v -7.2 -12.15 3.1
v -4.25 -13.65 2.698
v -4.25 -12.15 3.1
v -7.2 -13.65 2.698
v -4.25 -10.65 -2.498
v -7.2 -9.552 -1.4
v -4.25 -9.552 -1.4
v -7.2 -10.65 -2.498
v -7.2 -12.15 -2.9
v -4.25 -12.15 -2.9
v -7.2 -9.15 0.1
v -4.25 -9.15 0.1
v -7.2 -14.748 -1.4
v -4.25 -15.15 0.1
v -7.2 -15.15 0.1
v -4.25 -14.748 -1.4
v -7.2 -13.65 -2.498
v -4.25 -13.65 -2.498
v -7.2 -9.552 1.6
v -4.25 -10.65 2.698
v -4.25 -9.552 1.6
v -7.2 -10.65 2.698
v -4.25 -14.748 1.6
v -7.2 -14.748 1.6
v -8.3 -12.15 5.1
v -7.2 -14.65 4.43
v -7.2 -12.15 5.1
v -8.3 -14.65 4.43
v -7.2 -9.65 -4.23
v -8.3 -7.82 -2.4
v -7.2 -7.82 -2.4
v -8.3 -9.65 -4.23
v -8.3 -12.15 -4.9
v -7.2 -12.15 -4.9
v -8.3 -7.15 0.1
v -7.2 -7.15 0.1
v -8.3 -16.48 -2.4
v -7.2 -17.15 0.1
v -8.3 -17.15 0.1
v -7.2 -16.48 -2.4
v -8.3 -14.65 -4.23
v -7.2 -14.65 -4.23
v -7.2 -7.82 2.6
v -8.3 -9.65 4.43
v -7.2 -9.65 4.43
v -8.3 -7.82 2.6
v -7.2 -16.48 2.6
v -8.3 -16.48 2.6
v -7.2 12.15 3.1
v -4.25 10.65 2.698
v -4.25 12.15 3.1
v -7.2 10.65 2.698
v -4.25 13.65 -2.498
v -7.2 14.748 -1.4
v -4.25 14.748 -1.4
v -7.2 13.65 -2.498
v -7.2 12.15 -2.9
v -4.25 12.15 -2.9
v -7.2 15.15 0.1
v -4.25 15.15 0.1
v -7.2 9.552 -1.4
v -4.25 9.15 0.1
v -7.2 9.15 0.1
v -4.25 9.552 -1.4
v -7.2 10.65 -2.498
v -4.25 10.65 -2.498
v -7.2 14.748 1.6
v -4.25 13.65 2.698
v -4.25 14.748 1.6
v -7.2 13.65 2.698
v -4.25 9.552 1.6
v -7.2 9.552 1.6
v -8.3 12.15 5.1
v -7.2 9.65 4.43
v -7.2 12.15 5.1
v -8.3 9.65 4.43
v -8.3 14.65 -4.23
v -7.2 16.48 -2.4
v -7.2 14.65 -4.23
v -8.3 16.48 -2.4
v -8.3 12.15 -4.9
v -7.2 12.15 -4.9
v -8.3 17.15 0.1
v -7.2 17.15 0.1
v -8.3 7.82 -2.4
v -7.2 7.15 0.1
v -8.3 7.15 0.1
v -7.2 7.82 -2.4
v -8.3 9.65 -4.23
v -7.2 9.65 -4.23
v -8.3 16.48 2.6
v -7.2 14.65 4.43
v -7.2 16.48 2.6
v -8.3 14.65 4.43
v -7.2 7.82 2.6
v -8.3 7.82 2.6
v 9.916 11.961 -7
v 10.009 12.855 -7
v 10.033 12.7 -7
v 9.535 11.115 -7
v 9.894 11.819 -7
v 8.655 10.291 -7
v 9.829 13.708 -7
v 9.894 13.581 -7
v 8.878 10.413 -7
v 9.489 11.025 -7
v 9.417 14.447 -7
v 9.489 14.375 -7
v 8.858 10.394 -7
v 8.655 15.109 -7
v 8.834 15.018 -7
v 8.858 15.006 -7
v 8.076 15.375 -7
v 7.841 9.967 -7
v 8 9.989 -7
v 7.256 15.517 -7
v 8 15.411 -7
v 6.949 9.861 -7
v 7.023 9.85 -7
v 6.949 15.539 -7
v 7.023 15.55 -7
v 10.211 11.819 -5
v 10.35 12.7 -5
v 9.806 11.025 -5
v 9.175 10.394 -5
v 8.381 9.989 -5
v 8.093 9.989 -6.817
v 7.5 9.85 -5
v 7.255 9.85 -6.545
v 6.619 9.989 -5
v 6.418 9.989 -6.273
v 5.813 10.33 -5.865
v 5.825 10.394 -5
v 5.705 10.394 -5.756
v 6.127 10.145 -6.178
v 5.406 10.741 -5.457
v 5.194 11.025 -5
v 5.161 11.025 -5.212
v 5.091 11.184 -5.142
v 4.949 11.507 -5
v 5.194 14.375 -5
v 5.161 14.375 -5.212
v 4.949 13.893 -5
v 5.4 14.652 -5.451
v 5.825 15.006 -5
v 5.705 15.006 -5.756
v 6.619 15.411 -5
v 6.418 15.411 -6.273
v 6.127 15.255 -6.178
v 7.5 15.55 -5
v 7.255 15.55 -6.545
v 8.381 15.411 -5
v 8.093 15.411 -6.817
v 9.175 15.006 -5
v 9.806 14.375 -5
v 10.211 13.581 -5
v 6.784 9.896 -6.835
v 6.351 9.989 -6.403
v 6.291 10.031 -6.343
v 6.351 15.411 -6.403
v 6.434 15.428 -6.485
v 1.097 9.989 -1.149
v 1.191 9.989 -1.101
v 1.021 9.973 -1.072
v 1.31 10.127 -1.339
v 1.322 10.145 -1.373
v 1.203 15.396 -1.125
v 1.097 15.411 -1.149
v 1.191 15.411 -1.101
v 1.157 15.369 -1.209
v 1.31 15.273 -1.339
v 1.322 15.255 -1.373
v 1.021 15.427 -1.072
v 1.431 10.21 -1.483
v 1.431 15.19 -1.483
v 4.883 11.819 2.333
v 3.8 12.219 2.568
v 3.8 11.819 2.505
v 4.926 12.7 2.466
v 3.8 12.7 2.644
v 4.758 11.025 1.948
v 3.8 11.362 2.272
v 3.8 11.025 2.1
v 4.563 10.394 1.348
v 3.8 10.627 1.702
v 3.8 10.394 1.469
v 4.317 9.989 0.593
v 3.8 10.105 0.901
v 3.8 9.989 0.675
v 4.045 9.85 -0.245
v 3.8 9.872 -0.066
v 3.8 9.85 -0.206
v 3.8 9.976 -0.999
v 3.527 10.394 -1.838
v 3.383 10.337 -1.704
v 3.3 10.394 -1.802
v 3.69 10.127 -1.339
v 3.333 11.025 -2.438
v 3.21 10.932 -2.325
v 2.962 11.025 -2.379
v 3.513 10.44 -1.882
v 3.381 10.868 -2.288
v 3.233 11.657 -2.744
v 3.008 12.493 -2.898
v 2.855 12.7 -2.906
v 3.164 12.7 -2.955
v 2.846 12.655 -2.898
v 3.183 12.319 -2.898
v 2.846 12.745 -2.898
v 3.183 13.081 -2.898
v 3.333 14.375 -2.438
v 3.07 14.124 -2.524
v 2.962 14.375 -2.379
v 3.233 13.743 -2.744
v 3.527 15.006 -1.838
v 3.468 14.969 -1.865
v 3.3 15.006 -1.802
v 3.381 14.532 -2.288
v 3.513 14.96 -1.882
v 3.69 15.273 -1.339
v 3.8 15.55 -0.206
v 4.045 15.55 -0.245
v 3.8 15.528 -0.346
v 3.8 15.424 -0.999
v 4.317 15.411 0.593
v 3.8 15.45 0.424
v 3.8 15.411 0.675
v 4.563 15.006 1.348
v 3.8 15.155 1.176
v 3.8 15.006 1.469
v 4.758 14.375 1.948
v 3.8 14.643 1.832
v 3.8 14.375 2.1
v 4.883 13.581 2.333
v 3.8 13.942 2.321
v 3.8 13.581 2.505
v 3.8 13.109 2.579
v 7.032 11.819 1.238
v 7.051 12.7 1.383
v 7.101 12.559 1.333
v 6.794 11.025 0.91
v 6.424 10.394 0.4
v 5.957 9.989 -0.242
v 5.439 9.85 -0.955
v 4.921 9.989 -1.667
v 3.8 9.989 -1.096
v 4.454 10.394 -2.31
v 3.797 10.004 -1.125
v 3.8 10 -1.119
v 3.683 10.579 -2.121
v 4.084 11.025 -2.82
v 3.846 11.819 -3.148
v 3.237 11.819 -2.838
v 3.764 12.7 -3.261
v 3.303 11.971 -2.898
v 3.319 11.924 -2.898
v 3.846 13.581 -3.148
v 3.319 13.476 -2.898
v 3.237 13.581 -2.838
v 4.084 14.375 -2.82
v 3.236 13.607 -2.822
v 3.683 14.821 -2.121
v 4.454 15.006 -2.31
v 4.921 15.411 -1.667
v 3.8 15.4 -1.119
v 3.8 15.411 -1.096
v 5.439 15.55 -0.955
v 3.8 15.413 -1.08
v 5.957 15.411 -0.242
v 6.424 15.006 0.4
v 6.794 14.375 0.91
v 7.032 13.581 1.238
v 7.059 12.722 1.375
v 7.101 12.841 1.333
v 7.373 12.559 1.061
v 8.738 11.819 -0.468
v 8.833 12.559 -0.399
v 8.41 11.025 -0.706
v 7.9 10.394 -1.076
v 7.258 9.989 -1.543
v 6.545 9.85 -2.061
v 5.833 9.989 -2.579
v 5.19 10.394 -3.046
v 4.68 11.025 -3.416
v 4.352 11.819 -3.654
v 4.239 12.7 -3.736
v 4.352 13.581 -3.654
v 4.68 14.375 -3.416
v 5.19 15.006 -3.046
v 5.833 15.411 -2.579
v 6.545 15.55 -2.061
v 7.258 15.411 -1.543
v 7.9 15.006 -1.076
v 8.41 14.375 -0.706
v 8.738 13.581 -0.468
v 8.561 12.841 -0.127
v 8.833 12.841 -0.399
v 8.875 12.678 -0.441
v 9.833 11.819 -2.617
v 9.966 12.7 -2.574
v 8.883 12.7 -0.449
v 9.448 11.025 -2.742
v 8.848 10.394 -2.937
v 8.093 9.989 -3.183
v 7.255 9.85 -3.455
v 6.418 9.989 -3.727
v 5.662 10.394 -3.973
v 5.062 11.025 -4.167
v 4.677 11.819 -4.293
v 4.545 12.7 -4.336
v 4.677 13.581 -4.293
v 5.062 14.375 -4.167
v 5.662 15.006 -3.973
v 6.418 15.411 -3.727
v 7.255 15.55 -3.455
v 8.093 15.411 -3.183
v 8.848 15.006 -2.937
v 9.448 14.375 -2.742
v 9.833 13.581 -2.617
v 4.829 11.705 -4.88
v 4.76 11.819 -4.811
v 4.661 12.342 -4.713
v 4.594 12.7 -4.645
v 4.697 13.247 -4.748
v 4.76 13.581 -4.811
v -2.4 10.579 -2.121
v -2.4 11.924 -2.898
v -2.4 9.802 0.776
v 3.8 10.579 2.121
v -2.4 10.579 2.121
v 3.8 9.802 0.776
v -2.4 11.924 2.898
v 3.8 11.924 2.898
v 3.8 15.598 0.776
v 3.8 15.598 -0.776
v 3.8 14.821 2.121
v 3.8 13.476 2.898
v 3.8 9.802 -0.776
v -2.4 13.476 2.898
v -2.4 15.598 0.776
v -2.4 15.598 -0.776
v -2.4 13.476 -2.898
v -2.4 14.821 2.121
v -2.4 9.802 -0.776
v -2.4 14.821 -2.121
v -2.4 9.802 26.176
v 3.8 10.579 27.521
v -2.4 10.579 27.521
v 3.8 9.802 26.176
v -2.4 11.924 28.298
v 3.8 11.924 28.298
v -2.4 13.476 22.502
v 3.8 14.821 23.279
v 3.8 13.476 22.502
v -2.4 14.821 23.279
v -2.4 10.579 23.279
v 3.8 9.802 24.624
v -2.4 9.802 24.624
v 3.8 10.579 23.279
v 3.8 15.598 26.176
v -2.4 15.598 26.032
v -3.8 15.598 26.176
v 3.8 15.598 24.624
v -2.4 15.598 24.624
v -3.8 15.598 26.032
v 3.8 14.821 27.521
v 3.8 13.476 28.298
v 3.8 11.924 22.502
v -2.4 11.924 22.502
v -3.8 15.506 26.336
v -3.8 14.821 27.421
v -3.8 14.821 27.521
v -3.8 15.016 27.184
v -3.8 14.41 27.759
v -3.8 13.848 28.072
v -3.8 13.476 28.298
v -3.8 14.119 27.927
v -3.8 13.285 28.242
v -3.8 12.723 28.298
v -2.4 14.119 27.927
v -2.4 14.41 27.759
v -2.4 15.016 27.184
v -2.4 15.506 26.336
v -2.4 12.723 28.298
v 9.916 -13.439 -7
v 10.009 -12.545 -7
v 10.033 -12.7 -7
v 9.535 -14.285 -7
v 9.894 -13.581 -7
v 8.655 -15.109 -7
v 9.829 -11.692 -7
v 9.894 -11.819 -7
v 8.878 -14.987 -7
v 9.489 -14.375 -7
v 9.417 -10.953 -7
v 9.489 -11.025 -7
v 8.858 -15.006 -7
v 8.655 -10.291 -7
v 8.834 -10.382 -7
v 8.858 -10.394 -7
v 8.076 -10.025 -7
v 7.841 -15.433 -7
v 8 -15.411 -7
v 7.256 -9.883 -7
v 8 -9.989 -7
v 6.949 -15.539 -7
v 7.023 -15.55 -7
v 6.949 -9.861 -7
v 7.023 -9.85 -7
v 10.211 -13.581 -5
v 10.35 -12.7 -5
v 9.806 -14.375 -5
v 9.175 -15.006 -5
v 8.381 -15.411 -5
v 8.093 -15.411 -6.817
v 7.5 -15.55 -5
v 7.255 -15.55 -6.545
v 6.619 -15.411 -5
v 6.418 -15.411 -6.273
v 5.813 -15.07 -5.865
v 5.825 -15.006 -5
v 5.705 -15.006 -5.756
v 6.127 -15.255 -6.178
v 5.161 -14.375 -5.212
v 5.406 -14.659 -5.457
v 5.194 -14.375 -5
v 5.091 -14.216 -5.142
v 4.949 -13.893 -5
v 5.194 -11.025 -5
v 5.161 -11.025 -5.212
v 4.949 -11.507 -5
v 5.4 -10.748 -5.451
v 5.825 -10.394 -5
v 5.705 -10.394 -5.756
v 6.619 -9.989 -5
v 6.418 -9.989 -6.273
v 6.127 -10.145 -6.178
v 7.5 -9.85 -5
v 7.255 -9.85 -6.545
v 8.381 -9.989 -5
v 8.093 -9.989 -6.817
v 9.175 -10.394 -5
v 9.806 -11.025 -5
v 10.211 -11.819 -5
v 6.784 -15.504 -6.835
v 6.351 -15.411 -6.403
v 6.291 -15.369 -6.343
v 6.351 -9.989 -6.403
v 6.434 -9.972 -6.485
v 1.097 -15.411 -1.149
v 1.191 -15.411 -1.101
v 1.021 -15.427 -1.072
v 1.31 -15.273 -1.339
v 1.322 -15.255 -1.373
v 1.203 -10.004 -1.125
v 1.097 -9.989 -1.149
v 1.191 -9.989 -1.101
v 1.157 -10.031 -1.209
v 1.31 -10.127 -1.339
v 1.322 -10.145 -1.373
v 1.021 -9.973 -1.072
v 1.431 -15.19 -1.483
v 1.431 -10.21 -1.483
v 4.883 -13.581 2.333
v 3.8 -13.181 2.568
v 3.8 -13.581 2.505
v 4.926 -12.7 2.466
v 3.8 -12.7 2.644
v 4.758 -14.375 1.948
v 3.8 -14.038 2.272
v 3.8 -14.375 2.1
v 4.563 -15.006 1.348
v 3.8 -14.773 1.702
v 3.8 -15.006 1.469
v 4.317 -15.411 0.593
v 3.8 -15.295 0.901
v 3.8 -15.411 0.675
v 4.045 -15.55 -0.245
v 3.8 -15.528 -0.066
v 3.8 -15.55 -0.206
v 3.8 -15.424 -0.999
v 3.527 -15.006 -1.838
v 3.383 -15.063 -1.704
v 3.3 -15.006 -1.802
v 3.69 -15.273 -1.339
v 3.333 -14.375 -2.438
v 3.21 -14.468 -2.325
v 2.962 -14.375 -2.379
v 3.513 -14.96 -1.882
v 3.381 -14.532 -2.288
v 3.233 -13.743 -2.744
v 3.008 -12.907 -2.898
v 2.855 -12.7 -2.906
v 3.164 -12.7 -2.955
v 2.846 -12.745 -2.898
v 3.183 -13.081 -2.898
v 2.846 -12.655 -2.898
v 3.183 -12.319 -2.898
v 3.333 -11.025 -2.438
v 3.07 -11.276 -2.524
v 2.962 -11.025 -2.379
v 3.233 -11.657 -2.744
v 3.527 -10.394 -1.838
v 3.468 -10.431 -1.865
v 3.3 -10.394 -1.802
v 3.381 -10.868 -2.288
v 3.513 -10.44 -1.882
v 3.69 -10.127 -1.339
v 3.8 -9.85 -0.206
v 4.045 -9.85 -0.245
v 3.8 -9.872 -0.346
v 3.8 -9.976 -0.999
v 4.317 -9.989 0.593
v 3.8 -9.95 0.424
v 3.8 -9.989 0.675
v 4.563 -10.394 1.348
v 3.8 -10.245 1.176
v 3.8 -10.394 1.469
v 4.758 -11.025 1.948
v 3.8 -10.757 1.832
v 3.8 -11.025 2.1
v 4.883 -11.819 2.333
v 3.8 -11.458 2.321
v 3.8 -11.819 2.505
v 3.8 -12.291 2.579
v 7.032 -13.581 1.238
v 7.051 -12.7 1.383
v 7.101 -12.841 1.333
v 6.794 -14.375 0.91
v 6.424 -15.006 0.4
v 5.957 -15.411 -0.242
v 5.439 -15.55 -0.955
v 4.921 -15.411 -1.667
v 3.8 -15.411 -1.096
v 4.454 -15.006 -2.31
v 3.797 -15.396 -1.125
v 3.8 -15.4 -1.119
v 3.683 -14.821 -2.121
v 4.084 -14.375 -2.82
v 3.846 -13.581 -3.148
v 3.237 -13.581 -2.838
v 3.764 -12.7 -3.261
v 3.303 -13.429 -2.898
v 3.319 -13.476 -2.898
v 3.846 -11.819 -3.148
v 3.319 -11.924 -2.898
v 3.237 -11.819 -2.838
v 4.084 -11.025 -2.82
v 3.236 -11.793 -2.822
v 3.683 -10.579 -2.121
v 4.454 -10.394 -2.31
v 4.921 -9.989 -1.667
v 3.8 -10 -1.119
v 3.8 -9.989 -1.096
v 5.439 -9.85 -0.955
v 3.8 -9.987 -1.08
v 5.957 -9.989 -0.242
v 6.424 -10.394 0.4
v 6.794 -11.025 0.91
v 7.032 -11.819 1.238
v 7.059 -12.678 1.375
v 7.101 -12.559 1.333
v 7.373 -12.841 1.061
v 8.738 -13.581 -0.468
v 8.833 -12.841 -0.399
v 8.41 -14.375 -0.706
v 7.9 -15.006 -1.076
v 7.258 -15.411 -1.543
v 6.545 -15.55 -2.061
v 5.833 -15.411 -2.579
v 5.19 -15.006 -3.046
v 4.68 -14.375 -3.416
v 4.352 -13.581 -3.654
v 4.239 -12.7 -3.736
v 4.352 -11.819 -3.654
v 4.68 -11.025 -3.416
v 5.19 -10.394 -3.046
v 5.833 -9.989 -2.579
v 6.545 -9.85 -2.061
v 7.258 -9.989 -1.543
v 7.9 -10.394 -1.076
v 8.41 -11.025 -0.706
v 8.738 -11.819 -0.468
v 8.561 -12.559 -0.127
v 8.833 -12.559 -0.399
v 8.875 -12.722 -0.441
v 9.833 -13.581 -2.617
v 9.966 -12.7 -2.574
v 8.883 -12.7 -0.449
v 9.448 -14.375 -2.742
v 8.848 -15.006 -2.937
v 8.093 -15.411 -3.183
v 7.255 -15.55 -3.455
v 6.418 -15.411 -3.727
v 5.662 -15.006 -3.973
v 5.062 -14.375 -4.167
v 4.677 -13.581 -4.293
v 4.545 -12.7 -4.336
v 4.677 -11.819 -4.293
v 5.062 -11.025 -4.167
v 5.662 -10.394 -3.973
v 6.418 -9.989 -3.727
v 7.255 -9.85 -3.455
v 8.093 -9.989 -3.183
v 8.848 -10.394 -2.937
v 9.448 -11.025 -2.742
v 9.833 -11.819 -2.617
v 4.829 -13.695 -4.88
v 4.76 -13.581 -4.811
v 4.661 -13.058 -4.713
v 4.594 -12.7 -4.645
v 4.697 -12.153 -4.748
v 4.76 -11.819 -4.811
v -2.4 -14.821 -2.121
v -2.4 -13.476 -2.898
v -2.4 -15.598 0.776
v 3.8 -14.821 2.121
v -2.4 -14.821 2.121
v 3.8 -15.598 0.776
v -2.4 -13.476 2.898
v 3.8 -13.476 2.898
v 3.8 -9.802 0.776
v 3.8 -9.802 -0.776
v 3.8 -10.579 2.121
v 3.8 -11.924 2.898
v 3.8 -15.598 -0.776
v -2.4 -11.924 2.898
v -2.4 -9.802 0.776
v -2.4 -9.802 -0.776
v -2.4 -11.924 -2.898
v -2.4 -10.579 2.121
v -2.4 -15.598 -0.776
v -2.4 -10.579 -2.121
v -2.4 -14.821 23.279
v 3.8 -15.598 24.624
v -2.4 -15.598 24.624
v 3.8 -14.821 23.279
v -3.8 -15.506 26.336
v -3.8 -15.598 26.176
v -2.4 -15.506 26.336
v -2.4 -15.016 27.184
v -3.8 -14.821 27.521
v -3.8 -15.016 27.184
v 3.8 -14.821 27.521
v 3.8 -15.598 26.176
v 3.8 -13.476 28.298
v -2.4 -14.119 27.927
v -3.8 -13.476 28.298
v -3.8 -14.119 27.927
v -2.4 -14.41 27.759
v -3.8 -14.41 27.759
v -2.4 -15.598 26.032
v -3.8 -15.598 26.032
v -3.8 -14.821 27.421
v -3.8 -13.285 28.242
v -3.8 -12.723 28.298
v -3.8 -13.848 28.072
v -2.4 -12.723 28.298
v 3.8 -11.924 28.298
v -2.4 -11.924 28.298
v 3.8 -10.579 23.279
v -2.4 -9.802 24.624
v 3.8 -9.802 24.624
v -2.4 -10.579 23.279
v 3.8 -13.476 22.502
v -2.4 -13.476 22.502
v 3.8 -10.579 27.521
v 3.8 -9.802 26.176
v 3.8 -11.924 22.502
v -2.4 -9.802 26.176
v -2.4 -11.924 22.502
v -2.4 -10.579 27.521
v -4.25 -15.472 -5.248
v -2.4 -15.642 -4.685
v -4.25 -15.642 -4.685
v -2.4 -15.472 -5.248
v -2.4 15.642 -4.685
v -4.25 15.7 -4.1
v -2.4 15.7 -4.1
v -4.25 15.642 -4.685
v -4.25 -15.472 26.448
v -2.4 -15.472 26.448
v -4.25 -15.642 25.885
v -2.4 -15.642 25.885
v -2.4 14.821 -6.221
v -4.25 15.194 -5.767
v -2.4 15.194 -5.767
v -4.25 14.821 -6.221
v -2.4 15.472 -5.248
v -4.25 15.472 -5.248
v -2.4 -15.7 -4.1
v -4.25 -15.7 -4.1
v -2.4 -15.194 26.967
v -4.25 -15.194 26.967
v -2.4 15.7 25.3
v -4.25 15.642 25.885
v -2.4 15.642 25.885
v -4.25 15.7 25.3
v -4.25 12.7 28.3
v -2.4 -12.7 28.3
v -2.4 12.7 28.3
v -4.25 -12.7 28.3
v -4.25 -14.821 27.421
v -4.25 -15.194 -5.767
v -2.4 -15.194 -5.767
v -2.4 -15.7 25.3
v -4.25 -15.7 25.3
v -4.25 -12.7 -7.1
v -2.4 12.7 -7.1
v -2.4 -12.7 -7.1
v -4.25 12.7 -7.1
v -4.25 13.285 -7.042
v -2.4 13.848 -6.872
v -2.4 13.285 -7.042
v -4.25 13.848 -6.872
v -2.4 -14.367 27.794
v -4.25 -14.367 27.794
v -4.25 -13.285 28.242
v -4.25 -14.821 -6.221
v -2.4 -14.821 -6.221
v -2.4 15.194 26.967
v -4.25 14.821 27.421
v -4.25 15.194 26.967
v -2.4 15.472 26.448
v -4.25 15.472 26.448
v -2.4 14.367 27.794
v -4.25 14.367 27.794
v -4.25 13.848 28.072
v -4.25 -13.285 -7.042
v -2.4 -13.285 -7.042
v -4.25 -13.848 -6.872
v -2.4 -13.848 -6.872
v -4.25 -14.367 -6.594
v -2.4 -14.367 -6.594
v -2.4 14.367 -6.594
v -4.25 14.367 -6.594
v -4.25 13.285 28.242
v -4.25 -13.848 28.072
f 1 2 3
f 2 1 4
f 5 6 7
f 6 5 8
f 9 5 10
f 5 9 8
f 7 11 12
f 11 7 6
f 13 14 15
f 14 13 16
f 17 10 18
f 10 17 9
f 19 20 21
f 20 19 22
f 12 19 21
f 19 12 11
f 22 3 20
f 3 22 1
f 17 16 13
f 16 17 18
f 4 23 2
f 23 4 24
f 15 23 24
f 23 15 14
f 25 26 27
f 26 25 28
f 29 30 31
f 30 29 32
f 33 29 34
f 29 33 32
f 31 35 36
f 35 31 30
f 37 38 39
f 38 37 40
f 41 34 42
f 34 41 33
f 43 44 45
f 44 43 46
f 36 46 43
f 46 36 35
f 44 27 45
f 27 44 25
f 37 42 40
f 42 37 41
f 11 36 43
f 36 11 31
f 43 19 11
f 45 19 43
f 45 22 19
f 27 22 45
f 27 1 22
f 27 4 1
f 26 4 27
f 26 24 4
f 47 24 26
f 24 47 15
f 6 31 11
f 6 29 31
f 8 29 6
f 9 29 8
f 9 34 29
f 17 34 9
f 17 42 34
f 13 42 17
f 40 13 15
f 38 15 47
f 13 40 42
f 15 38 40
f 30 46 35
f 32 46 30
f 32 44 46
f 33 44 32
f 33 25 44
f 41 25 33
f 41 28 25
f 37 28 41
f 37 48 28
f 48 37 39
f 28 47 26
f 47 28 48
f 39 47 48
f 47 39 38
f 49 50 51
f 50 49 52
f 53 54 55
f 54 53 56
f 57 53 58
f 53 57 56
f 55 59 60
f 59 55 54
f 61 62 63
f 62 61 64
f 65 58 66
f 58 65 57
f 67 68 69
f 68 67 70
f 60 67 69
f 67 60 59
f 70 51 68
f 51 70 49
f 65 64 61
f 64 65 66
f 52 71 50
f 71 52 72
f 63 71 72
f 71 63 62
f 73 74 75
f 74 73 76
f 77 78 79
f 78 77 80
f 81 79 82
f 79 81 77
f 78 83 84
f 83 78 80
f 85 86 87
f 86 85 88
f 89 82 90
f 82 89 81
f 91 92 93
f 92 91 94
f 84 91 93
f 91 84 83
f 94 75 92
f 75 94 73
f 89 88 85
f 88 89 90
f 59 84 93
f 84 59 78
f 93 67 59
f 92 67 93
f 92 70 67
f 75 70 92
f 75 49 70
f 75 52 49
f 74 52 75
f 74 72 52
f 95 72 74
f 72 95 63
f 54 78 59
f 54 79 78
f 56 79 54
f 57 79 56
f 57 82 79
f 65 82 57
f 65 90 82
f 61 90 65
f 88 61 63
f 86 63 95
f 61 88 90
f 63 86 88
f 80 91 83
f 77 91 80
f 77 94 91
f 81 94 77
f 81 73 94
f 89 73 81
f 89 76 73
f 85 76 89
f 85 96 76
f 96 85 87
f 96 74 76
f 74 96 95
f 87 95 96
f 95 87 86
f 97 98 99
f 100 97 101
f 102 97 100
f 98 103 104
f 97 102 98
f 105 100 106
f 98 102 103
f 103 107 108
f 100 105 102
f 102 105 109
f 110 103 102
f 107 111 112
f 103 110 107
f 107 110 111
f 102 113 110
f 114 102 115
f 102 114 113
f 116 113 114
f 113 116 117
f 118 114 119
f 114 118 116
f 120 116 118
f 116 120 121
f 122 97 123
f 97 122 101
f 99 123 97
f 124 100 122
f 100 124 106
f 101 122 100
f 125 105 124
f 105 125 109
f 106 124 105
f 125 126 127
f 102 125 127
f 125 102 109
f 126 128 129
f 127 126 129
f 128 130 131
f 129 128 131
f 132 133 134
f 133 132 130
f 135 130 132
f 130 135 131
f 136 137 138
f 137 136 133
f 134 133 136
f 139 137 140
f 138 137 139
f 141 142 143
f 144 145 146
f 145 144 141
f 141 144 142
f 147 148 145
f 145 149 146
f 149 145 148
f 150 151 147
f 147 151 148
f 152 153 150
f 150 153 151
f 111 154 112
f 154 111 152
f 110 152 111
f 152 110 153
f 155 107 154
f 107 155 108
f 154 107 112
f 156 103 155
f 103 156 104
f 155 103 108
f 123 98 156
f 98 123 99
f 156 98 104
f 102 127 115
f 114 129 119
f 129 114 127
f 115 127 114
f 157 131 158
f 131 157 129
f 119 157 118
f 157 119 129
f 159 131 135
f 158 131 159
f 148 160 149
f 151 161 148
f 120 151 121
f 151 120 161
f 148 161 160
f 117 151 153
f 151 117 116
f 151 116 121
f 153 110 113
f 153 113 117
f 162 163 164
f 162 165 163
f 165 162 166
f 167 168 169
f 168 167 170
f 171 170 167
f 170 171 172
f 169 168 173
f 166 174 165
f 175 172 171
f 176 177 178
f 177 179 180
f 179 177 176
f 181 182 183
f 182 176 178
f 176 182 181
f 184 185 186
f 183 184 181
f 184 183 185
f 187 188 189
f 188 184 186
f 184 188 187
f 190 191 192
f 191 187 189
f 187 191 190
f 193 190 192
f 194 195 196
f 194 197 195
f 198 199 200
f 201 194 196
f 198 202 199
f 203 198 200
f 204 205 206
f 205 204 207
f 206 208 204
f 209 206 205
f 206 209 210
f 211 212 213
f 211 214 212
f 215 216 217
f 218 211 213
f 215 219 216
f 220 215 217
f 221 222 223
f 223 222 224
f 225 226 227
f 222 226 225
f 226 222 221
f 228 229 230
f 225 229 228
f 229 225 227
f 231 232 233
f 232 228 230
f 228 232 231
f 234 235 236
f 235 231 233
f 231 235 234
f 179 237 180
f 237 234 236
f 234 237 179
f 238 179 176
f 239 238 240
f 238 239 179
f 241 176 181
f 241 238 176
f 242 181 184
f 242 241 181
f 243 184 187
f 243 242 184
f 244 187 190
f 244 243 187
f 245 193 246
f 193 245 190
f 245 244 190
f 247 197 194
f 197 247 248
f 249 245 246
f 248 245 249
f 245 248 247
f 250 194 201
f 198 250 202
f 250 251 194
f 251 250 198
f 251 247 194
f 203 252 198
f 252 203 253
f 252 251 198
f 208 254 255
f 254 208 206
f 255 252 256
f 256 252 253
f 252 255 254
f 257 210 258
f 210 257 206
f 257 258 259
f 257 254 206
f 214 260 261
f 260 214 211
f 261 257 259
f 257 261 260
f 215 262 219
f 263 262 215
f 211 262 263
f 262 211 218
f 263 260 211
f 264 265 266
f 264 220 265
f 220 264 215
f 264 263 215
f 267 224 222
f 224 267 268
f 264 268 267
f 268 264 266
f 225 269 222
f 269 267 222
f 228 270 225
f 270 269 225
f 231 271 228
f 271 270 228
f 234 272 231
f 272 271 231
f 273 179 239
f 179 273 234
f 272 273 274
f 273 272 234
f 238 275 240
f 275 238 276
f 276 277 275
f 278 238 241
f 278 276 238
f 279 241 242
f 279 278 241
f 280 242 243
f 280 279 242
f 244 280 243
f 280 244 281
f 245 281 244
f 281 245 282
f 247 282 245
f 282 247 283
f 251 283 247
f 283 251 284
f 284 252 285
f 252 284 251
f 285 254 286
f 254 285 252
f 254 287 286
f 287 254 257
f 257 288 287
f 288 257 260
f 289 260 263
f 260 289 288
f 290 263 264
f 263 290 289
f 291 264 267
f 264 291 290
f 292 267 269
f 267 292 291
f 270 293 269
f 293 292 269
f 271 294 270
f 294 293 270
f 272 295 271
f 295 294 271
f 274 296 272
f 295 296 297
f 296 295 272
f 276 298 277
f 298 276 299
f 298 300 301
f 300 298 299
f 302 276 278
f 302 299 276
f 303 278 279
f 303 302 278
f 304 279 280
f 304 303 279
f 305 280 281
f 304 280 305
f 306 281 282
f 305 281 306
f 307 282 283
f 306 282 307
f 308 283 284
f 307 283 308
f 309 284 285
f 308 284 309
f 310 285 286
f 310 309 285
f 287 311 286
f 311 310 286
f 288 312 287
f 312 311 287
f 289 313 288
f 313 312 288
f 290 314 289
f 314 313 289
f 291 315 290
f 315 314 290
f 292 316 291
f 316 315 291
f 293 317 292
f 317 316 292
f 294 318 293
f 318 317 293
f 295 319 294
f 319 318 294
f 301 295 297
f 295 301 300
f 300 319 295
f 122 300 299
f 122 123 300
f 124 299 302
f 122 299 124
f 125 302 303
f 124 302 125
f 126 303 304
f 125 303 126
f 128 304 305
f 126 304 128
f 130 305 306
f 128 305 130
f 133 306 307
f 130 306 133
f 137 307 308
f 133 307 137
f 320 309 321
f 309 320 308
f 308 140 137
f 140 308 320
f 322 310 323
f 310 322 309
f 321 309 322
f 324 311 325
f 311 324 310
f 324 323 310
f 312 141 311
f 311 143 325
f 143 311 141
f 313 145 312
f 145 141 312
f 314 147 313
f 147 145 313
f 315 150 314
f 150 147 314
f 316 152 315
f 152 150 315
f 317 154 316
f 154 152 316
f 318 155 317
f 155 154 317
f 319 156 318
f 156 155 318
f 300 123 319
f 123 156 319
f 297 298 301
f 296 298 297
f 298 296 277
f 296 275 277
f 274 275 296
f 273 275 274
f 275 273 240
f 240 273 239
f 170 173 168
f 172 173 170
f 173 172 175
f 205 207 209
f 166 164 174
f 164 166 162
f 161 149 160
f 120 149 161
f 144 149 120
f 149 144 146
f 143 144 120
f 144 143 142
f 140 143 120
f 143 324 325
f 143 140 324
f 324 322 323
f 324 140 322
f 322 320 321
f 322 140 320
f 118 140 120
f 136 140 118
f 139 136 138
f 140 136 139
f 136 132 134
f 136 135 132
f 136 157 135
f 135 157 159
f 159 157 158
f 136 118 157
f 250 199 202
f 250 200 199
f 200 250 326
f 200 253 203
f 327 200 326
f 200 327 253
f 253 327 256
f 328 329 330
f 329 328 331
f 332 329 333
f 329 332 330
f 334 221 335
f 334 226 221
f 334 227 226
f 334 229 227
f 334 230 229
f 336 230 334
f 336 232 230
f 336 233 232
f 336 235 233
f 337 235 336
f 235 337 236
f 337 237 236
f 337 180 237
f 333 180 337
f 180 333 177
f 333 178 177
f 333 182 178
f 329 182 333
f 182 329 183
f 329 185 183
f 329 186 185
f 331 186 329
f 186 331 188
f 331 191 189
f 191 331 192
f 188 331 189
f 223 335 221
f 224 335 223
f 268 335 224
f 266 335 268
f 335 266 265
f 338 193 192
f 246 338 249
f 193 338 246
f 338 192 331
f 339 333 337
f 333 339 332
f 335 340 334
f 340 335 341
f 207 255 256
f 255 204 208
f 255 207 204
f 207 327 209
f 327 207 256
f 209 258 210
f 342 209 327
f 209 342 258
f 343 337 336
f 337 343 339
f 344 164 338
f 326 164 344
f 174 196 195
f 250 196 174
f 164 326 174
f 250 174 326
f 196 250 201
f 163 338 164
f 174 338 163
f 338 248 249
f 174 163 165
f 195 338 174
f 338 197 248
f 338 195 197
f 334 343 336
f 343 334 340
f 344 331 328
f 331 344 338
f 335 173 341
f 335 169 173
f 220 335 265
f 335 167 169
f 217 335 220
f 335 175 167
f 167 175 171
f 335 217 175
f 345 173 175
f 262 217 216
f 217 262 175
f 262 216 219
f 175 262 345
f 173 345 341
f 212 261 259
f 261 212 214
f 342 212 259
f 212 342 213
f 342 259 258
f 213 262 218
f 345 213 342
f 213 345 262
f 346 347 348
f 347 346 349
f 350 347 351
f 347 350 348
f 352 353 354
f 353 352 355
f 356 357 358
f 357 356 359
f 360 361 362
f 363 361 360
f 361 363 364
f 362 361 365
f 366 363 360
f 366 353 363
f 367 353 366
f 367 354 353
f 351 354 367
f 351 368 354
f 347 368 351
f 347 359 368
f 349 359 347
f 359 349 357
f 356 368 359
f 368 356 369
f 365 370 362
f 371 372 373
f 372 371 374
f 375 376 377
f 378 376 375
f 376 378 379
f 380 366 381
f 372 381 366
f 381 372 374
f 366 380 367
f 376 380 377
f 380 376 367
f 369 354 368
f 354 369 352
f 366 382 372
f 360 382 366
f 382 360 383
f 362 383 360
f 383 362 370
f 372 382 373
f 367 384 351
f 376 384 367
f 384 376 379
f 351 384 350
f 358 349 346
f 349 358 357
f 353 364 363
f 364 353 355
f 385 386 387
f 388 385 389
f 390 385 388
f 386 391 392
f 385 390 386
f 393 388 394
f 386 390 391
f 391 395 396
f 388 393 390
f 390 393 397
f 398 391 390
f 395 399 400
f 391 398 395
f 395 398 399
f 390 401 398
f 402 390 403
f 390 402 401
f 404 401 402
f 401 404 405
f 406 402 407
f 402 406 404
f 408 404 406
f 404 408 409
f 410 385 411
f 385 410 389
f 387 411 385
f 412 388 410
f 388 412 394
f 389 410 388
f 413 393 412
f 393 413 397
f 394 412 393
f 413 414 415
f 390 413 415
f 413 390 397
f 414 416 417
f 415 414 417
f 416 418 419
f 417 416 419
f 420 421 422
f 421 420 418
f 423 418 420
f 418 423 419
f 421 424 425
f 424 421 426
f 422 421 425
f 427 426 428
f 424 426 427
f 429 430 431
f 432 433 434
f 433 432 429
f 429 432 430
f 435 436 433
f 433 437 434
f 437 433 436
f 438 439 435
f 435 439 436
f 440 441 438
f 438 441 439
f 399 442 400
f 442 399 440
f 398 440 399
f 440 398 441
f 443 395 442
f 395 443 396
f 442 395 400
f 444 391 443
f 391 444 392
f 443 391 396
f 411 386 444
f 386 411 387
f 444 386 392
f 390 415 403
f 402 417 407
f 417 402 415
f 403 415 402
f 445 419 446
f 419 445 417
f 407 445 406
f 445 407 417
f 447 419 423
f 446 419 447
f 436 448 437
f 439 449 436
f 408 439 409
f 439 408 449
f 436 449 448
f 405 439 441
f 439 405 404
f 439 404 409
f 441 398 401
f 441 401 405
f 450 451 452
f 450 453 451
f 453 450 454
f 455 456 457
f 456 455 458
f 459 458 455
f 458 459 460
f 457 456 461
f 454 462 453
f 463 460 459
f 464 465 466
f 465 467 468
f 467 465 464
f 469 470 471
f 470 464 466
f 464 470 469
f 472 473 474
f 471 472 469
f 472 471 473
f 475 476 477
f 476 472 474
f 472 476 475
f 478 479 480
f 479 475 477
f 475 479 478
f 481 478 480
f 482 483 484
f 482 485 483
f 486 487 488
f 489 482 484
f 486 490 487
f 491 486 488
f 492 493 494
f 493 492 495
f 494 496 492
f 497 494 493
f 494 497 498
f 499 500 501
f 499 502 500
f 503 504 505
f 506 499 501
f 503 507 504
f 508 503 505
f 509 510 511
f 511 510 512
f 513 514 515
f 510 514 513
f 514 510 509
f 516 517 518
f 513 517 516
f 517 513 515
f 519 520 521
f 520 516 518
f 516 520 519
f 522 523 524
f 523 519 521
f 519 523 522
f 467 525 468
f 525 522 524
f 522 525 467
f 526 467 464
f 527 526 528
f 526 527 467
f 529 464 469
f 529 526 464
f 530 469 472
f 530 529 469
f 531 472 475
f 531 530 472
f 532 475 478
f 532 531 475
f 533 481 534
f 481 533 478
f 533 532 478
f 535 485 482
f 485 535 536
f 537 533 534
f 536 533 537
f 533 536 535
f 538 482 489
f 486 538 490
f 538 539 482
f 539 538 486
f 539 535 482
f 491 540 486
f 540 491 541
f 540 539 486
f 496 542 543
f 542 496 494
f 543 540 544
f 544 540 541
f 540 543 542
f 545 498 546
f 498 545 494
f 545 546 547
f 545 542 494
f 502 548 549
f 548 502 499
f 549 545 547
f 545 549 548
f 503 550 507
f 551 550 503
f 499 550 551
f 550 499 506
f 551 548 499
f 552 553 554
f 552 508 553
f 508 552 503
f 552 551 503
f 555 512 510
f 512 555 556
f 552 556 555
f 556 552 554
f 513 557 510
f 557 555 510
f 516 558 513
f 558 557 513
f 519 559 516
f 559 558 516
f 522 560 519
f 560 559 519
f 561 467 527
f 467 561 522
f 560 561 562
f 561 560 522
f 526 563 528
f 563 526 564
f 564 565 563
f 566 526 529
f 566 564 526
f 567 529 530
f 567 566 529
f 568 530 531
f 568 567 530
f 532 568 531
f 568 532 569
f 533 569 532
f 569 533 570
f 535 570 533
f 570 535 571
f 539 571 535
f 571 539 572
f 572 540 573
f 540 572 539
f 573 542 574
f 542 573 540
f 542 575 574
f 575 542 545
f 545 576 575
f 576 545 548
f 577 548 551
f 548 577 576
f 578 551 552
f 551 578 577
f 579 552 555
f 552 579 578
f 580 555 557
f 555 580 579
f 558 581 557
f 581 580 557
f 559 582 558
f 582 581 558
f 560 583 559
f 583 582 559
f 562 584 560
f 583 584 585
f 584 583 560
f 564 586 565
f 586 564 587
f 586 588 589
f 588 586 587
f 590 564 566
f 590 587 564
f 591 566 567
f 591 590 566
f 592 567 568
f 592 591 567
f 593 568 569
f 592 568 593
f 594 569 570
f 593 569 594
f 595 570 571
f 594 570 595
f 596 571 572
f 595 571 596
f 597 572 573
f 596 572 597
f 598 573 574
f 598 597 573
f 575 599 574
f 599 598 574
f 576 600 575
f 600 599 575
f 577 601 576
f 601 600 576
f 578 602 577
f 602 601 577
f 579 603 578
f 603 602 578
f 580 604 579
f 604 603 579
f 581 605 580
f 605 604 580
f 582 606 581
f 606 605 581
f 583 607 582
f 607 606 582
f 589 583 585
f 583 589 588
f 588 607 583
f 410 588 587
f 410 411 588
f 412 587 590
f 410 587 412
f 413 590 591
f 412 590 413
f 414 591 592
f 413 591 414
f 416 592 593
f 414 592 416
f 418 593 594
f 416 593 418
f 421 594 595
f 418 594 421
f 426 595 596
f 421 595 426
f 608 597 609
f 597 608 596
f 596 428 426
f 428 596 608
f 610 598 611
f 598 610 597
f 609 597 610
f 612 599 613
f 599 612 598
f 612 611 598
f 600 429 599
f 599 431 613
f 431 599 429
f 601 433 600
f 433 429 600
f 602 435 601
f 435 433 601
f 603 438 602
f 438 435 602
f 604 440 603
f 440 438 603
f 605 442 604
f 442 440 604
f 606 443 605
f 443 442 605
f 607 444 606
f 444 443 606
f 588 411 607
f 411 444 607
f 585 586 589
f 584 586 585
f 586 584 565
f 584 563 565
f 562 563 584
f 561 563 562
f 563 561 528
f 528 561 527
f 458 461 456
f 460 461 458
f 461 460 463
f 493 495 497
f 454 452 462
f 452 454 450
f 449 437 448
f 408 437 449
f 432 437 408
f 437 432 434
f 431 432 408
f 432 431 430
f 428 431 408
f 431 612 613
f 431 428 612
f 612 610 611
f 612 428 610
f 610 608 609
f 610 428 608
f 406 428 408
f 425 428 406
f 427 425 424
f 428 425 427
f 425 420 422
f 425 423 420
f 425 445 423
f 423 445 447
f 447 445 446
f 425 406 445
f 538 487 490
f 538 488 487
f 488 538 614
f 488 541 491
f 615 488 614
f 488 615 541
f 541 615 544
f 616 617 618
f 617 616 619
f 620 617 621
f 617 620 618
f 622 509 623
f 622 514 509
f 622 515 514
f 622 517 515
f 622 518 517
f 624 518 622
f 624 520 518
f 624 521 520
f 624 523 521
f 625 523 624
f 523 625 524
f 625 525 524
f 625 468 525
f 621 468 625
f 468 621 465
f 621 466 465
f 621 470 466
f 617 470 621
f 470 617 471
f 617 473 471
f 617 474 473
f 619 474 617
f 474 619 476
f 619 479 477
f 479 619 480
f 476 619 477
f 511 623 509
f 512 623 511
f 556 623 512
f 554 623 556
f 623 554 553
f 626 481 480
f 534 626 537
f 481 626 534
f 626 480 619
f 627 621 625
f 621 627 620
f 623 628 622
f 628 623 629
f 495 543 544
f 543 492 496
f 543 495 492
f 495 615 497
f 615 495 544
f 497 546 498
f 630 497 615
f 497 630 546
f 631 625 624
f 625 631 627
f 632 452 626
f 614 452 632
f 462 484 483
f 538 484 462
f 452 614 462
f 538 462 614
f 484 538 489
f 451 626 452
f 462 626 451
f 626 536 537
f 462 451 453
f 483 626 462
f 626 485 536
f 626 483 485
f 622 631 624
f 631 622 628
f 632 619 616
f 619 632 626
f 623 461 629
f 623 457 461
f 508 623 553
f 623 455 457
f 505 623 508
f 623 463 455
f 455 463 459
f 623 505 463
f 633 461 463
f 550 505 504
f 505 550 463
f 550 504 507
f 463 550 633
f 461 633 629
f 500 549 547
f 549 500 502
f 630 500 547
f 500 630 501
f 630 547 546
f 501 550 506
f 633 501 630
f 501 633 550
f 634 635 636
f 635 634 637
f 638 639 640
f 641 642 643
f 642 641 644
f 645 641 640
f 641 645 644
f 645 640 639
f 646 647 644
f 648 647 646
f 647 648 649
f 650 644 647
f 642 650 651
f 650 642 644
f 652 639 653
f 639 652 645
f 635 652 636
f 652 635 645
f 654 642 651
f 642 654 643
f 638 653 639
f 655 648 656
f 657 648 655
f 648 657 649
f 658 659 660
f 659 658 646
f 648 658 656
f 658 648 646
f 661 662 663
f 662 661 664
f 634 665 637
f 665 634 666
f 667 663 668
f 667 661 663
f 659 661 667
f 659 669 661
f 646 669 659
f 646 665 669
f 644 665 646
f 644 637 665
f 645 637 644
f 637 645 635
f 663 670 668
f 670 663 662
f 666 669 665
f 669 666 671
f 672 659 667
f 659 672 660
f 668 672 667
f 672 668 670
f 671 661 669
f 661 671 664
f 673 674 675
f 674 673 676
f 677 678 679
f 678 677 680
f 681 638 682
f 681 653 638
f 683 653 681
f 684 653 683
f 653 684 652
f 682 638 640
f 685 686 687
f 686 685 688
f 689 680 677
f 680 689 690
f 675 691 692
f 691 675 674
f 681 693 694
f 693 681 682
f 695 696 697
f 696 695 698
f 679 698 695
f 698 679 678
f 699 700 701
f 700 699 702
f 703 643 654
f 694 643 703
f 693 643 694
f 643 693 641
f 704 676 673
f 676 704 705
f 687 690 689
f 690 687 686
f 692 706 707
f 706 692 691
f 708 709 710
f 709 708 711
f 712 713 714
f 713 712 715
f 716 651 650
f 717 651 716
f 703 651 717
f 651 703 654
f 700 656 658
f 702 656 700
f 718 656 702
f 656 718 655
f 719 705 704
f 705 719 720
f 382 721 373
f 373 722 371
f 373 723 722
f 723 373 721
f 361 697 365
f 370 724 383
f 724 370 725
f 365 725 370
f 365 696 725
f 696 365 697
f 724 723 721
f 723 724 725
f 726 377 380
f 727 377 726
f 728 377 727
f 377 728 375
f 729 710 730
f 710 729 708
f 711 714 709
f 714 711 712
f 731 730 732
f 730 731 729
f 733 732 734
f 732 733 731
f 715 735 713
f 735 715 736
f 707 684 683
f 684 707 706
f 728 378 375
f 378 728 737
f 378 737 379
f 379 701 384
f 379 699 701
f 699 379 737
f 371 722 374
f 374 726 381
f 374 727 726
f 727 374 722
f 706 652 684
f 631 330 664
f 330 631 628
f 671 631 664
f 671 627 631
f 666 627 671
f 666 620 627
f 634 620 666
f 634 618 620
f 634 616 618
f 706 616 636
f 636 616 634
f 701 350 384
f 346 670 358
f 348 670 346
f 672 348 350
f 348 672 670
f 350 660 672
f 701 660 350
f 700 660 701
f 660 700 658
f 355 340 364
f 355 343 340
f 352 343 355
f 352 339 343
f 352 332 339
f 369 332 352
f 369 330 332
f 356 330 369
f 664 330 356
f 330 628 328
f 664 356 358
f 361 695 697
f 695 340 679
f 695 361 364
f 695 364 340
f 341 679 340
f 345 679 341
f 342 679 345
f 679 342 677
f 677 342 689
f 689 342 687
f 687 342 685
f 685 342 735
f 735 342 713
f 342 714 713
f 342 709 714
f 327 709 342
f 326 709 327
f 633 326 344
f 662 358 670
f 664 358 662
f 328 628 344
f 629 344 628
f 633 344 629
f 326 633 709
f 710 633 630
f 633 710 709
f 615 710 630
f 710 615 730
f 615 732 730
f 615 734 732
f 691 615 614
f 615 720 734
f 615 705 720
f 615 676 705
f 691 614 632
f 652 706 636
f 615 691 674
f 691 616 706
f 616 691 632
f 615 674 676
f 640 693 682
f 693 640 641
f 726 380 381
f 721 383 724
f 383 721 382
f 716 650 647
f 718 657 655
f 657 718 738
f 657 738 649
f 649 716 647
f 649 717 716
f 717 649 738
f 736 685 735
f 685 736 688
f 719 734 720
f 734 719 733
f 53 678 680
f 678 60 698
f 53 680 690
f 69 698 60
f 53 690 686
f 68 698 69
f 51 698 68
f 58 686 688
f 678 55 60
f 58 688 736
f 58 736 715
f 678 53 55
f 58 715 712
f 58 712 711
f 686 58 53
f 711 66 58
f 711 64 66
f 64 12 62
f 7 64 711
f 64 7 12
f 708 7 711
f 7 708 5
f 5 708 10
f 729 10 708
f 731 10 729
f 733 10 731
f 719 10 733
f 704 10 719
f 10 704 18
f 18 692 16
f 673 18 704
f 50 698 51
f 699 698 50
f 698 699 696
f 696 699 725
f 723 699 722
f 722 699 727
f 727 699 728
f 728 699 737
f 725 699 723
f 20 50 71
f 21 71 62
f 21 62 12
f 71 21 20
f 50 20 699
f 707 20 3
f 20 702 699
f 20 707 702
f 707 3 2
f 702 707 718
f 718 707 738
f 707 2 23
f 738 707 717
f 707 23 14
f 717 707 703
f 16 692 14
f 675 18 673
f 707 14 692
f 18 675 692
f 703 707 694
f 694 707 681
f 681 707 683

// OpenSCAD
// keyhole slot remix of PEGSTR - Pegboard Wizard
// Modified by Shawn Featherly, October 2018
// Original PEGSTR - Pegboard Wizard by Marius Gheorghescu, November 2014

// preview[view:north, tilt:bottom diagonal]

// width / diameter of the keyslot neck
key_neck_width = 6;

// length of keyslot exposed neck
key_neck_length = 3;

// width / diameter of the keyslot head
key_head_width = 10;

// length of the keyslot head
key_head_length = 1;

// how far the 2 keyslots are from one another. 24.3
keyslot_seperation = 24.3;

// how thick are the walls. Hint: 6*extrusion width produces the best results.
wall_thickness = 1.85;

/* [Advanced] */
// what ratio of the holders bottom is reinforced to the plate [0.0-1.0]
strength_factor = 0.66;


/* [Hidden] */
// width of the panel
holder_x_size = keyslot_seperation + 10;

// depth of the orifice
holder_y_size = 10;

// hight of the holder
holder_height = 15;

// how many times to repeat the holder on X axis
holder_x_count = 1;

// how many times to repeat the holder on Y axis
holder_y_count = 2;

// orifice corner radius (roundness). Needs to be less than min(x,y)/2.
corner_radius = 30;

// what is the $fn parameter
holder_sides = max(50, min(20, holder_x_size*2));

// dimensions the same outside US?
hole_spacing = 25.4;
hole_size = 6;//6.0035;
board_thickness = 5;


holder_total_x = wall_thickness + holder_x_count*(wall_thickness+holder_x_size);
holder_total_y = wall_thickness + holder_y_count*(wall_thickness+holder_y_size);
holder_total_z = round(holder_height/hole_spacing)*hole_spacing;
holder_roundness = min(corner_radius, holder_x_size/2, holder_y_size/2); 


// what is the $fn parameter for holders
fn = 32;

epsilon = 0.1;

clip_height = 2*hole_size + 2;
$fn = fn;

module round_rect_ex(x1, y1, x2, y2, z, r1, r2)
{
	$fn=holder_sides;
	brim = z/10;

	//rotate([0,0,(holder_sides==6)?30:((holder_sides==4)?45:0)])
	hull() {
        translate([-x1/2 + r1, y1/2 - r1, z/2-brim/2])
            cylinder(r=r1, h=brim,center=true);
        translate([x1/2 - r1, y1/2 - r1, z/2-brim/2])
            cylinder(r=r1, h=brim,center=true);
        translate([-x1/2 + r1, -y1/2 + r1, z/2-brim/2])
            cylinder(r=r1, h=brim,center=true);
        translate([x1/2 - r1, -y1/2 + r1, z/2-brim/2])
            cylinder(r=r1, h=brim,center=true);

        translate([-x2/2 + r2, y2/2 - r2, -z/2+brim/2])
            cylinder(r=r2, h=brim,center=true);
        translate([x2/2 - r2, y2/2 - r2, -z/2+brim/2])
            cylinder(r=r2, h=brim,center=true);
        translate([-x2/2 + r2, -y2/2 + r2, -z/2+brim/2])
            cylinder(r=r2, h=brim,center=true);
        translate([x2/2 - r2, -y2/2 + r2, -z/2+brim/2])
            cylinder(r=r2, h=brim,center=true);

    }
}

module pin(clip)
{
	rotate([0,0,15])
		#cylinder(r=hole_size/2, h=board_thickness*1.5+epsilon, center=true, $fn=12);

// top row inserts should have a rounded tip
    
	if (clip) {
		//
		rotate([0,0,90])
		intersection() {
			translate([0, 0, hole_size-epsilon])
				cube([hole_size+2*epsilon, clip_height, 2*hole_size], center=true);

			// [-hole_size/2 - 1.95,0, board_thickness/2]
			translate([0, hole_size/2 + 2, board_thickness/2]) 
				rotate([0, 90, 0])
				rotate_extrude(convexity = 5, $fn=20)
				translate([5, 0, 0])
				 circle(r = (hole_size*0.95)/2); 
			
			translate([0, hole_size/2 + 2 - 1.6, board_thickness/2]) 
				rotate([45,0,0])
				translate([0, -0, hole_size*0.6])
					cube([hole_size+2*epsilon, 3*hole_size, hole_size], center=true);
		}
	}
}


module pinboard_clips() 
{
	rotate([0,90,0])
	for(i=[0:round(holder_total_x/hole_spacing)]) {
		for(j=[0:max(strength_factor, round(holder_height/hole_spacing))]) {

			translate([
				j*hole_spacing, 
				-hole_spacing*(round(holder_total_x/hole_spacing)/2) + i*hole_spacing, 
				0])
					pin(j==0);
		}
	}
}

module pinboard(clips)
{
	rotate([0,90,0])
	translate([-epsilon, 0, -wall_thickness - board_thickness/2 + epsilon])
	hull() {
		translate([-clip_height/2 + hole_size/2, 
			-hole_spacing*(round(holder_total_x/hole_spacing)/2),0])
			cylinder(r=hole_size/2, h=wall_thickness);

		translate([-clip_height/2 + hole_size/2, 
			hole_spacing*(round(holder_total_x/hole_spacing)/2),0])
			cylinder(r=hole_size/2,  h=wall_thickness);

		translate([max(strength_factor, round(holder_height/hole_spacing))*hole_spacing,
			-hole_spacing*(round(holder_total_x/hole_spacing)/2),0])
			cylinder(r=hole_size/2, h=wall_thickness);

		translate([max(strength_factor, round(holder_height/hole_spacing))*hole_spacing,
			hole_spacing*(round(holder_total_x/hole_spacing)/2),0])
			cylinder(r=hole_size/2,  h=wall_thickness);

	}
}

module key()
{
    // key neck
    #cylinder(r=key_neck_width/2, h=key_neck_length+epsilon, center=true, $fn=12);
    
    // key head
    //translate([0,0, -2*(key_neck_length- epsilon) - 2*key_head_length ])
    translate([0,0, -key_neck_length/2 - key_head_length/2 ])
    
    #cylinder(r=key_head_width/2, h=key_head_length+epsilon, center=true, $fn=12);
}
module keyslots();
{
	rotate([0,90,0])
	translate([-epsilon, 0, -wall_thickness - board_thickness/2 - key_neck_length/2 + epsilon])
    {
        // position keyslot1
        translate([0,-keyslot_seperation/2,0])
        key();
    
        // position keyslot2
        translate([0,keyslot_seperation/2,0])
        key();
    }
}
module pegstr() 
{
	difference() {
		union() {

// connects to pegboard insets
			pinboard();

// pegboard insets
			color([0,0,0])
			pinboard_clips();
            
// keyslot insets
            keyslots();
		}

/* Start Logo
		translate([-board_thickness/2,-1,-clip_height+5]) 
		rotate([-90,0,90]) {
			intersection() {
				union() {
					difference() {
						round_rect_ex(3, 10, 3, 10, 2, 1, 1);
						round_rect_ex(2, 9, 2, 9, 3, 1, 1);
					}
			
					translate([2.5, 0, 0]) 
						difference() {
							round_rect_ex(3, 10, 3, 10, 2, 1, 1);
							round_rect_ex(2, 9, 2, 9, 3, 1, 1);
						}
				}
			
				translate([0, -3.5, 0]) 
					cube([20,4,10], center=true);
			}
		
			translate([1.25, -2.5, 0]) 
				difference() {
					round_rect_ex(8, 7, 8, 7, 2, 1, 1);
					round_rect_ex(7, 6, 7, 6, 3, 1, 1);
		
					translate([3,0,0])
						cube([4,2.5,3], center=true);
				}
		
		
			translate([2.0, -1.0, 0]) 
				cube([8, 0.5, 2], center=true);
		
			translate([0,-2,0])
				cylinder(r=0.25, h=2, center=true, $fn=12);
		
			translate([2.5,-2,0])
				cylinder(r=0.25, h=2, center=true, $fn=12);
		}
End Logo */

	}
}


rotate([180,0,0]) pegstr();
